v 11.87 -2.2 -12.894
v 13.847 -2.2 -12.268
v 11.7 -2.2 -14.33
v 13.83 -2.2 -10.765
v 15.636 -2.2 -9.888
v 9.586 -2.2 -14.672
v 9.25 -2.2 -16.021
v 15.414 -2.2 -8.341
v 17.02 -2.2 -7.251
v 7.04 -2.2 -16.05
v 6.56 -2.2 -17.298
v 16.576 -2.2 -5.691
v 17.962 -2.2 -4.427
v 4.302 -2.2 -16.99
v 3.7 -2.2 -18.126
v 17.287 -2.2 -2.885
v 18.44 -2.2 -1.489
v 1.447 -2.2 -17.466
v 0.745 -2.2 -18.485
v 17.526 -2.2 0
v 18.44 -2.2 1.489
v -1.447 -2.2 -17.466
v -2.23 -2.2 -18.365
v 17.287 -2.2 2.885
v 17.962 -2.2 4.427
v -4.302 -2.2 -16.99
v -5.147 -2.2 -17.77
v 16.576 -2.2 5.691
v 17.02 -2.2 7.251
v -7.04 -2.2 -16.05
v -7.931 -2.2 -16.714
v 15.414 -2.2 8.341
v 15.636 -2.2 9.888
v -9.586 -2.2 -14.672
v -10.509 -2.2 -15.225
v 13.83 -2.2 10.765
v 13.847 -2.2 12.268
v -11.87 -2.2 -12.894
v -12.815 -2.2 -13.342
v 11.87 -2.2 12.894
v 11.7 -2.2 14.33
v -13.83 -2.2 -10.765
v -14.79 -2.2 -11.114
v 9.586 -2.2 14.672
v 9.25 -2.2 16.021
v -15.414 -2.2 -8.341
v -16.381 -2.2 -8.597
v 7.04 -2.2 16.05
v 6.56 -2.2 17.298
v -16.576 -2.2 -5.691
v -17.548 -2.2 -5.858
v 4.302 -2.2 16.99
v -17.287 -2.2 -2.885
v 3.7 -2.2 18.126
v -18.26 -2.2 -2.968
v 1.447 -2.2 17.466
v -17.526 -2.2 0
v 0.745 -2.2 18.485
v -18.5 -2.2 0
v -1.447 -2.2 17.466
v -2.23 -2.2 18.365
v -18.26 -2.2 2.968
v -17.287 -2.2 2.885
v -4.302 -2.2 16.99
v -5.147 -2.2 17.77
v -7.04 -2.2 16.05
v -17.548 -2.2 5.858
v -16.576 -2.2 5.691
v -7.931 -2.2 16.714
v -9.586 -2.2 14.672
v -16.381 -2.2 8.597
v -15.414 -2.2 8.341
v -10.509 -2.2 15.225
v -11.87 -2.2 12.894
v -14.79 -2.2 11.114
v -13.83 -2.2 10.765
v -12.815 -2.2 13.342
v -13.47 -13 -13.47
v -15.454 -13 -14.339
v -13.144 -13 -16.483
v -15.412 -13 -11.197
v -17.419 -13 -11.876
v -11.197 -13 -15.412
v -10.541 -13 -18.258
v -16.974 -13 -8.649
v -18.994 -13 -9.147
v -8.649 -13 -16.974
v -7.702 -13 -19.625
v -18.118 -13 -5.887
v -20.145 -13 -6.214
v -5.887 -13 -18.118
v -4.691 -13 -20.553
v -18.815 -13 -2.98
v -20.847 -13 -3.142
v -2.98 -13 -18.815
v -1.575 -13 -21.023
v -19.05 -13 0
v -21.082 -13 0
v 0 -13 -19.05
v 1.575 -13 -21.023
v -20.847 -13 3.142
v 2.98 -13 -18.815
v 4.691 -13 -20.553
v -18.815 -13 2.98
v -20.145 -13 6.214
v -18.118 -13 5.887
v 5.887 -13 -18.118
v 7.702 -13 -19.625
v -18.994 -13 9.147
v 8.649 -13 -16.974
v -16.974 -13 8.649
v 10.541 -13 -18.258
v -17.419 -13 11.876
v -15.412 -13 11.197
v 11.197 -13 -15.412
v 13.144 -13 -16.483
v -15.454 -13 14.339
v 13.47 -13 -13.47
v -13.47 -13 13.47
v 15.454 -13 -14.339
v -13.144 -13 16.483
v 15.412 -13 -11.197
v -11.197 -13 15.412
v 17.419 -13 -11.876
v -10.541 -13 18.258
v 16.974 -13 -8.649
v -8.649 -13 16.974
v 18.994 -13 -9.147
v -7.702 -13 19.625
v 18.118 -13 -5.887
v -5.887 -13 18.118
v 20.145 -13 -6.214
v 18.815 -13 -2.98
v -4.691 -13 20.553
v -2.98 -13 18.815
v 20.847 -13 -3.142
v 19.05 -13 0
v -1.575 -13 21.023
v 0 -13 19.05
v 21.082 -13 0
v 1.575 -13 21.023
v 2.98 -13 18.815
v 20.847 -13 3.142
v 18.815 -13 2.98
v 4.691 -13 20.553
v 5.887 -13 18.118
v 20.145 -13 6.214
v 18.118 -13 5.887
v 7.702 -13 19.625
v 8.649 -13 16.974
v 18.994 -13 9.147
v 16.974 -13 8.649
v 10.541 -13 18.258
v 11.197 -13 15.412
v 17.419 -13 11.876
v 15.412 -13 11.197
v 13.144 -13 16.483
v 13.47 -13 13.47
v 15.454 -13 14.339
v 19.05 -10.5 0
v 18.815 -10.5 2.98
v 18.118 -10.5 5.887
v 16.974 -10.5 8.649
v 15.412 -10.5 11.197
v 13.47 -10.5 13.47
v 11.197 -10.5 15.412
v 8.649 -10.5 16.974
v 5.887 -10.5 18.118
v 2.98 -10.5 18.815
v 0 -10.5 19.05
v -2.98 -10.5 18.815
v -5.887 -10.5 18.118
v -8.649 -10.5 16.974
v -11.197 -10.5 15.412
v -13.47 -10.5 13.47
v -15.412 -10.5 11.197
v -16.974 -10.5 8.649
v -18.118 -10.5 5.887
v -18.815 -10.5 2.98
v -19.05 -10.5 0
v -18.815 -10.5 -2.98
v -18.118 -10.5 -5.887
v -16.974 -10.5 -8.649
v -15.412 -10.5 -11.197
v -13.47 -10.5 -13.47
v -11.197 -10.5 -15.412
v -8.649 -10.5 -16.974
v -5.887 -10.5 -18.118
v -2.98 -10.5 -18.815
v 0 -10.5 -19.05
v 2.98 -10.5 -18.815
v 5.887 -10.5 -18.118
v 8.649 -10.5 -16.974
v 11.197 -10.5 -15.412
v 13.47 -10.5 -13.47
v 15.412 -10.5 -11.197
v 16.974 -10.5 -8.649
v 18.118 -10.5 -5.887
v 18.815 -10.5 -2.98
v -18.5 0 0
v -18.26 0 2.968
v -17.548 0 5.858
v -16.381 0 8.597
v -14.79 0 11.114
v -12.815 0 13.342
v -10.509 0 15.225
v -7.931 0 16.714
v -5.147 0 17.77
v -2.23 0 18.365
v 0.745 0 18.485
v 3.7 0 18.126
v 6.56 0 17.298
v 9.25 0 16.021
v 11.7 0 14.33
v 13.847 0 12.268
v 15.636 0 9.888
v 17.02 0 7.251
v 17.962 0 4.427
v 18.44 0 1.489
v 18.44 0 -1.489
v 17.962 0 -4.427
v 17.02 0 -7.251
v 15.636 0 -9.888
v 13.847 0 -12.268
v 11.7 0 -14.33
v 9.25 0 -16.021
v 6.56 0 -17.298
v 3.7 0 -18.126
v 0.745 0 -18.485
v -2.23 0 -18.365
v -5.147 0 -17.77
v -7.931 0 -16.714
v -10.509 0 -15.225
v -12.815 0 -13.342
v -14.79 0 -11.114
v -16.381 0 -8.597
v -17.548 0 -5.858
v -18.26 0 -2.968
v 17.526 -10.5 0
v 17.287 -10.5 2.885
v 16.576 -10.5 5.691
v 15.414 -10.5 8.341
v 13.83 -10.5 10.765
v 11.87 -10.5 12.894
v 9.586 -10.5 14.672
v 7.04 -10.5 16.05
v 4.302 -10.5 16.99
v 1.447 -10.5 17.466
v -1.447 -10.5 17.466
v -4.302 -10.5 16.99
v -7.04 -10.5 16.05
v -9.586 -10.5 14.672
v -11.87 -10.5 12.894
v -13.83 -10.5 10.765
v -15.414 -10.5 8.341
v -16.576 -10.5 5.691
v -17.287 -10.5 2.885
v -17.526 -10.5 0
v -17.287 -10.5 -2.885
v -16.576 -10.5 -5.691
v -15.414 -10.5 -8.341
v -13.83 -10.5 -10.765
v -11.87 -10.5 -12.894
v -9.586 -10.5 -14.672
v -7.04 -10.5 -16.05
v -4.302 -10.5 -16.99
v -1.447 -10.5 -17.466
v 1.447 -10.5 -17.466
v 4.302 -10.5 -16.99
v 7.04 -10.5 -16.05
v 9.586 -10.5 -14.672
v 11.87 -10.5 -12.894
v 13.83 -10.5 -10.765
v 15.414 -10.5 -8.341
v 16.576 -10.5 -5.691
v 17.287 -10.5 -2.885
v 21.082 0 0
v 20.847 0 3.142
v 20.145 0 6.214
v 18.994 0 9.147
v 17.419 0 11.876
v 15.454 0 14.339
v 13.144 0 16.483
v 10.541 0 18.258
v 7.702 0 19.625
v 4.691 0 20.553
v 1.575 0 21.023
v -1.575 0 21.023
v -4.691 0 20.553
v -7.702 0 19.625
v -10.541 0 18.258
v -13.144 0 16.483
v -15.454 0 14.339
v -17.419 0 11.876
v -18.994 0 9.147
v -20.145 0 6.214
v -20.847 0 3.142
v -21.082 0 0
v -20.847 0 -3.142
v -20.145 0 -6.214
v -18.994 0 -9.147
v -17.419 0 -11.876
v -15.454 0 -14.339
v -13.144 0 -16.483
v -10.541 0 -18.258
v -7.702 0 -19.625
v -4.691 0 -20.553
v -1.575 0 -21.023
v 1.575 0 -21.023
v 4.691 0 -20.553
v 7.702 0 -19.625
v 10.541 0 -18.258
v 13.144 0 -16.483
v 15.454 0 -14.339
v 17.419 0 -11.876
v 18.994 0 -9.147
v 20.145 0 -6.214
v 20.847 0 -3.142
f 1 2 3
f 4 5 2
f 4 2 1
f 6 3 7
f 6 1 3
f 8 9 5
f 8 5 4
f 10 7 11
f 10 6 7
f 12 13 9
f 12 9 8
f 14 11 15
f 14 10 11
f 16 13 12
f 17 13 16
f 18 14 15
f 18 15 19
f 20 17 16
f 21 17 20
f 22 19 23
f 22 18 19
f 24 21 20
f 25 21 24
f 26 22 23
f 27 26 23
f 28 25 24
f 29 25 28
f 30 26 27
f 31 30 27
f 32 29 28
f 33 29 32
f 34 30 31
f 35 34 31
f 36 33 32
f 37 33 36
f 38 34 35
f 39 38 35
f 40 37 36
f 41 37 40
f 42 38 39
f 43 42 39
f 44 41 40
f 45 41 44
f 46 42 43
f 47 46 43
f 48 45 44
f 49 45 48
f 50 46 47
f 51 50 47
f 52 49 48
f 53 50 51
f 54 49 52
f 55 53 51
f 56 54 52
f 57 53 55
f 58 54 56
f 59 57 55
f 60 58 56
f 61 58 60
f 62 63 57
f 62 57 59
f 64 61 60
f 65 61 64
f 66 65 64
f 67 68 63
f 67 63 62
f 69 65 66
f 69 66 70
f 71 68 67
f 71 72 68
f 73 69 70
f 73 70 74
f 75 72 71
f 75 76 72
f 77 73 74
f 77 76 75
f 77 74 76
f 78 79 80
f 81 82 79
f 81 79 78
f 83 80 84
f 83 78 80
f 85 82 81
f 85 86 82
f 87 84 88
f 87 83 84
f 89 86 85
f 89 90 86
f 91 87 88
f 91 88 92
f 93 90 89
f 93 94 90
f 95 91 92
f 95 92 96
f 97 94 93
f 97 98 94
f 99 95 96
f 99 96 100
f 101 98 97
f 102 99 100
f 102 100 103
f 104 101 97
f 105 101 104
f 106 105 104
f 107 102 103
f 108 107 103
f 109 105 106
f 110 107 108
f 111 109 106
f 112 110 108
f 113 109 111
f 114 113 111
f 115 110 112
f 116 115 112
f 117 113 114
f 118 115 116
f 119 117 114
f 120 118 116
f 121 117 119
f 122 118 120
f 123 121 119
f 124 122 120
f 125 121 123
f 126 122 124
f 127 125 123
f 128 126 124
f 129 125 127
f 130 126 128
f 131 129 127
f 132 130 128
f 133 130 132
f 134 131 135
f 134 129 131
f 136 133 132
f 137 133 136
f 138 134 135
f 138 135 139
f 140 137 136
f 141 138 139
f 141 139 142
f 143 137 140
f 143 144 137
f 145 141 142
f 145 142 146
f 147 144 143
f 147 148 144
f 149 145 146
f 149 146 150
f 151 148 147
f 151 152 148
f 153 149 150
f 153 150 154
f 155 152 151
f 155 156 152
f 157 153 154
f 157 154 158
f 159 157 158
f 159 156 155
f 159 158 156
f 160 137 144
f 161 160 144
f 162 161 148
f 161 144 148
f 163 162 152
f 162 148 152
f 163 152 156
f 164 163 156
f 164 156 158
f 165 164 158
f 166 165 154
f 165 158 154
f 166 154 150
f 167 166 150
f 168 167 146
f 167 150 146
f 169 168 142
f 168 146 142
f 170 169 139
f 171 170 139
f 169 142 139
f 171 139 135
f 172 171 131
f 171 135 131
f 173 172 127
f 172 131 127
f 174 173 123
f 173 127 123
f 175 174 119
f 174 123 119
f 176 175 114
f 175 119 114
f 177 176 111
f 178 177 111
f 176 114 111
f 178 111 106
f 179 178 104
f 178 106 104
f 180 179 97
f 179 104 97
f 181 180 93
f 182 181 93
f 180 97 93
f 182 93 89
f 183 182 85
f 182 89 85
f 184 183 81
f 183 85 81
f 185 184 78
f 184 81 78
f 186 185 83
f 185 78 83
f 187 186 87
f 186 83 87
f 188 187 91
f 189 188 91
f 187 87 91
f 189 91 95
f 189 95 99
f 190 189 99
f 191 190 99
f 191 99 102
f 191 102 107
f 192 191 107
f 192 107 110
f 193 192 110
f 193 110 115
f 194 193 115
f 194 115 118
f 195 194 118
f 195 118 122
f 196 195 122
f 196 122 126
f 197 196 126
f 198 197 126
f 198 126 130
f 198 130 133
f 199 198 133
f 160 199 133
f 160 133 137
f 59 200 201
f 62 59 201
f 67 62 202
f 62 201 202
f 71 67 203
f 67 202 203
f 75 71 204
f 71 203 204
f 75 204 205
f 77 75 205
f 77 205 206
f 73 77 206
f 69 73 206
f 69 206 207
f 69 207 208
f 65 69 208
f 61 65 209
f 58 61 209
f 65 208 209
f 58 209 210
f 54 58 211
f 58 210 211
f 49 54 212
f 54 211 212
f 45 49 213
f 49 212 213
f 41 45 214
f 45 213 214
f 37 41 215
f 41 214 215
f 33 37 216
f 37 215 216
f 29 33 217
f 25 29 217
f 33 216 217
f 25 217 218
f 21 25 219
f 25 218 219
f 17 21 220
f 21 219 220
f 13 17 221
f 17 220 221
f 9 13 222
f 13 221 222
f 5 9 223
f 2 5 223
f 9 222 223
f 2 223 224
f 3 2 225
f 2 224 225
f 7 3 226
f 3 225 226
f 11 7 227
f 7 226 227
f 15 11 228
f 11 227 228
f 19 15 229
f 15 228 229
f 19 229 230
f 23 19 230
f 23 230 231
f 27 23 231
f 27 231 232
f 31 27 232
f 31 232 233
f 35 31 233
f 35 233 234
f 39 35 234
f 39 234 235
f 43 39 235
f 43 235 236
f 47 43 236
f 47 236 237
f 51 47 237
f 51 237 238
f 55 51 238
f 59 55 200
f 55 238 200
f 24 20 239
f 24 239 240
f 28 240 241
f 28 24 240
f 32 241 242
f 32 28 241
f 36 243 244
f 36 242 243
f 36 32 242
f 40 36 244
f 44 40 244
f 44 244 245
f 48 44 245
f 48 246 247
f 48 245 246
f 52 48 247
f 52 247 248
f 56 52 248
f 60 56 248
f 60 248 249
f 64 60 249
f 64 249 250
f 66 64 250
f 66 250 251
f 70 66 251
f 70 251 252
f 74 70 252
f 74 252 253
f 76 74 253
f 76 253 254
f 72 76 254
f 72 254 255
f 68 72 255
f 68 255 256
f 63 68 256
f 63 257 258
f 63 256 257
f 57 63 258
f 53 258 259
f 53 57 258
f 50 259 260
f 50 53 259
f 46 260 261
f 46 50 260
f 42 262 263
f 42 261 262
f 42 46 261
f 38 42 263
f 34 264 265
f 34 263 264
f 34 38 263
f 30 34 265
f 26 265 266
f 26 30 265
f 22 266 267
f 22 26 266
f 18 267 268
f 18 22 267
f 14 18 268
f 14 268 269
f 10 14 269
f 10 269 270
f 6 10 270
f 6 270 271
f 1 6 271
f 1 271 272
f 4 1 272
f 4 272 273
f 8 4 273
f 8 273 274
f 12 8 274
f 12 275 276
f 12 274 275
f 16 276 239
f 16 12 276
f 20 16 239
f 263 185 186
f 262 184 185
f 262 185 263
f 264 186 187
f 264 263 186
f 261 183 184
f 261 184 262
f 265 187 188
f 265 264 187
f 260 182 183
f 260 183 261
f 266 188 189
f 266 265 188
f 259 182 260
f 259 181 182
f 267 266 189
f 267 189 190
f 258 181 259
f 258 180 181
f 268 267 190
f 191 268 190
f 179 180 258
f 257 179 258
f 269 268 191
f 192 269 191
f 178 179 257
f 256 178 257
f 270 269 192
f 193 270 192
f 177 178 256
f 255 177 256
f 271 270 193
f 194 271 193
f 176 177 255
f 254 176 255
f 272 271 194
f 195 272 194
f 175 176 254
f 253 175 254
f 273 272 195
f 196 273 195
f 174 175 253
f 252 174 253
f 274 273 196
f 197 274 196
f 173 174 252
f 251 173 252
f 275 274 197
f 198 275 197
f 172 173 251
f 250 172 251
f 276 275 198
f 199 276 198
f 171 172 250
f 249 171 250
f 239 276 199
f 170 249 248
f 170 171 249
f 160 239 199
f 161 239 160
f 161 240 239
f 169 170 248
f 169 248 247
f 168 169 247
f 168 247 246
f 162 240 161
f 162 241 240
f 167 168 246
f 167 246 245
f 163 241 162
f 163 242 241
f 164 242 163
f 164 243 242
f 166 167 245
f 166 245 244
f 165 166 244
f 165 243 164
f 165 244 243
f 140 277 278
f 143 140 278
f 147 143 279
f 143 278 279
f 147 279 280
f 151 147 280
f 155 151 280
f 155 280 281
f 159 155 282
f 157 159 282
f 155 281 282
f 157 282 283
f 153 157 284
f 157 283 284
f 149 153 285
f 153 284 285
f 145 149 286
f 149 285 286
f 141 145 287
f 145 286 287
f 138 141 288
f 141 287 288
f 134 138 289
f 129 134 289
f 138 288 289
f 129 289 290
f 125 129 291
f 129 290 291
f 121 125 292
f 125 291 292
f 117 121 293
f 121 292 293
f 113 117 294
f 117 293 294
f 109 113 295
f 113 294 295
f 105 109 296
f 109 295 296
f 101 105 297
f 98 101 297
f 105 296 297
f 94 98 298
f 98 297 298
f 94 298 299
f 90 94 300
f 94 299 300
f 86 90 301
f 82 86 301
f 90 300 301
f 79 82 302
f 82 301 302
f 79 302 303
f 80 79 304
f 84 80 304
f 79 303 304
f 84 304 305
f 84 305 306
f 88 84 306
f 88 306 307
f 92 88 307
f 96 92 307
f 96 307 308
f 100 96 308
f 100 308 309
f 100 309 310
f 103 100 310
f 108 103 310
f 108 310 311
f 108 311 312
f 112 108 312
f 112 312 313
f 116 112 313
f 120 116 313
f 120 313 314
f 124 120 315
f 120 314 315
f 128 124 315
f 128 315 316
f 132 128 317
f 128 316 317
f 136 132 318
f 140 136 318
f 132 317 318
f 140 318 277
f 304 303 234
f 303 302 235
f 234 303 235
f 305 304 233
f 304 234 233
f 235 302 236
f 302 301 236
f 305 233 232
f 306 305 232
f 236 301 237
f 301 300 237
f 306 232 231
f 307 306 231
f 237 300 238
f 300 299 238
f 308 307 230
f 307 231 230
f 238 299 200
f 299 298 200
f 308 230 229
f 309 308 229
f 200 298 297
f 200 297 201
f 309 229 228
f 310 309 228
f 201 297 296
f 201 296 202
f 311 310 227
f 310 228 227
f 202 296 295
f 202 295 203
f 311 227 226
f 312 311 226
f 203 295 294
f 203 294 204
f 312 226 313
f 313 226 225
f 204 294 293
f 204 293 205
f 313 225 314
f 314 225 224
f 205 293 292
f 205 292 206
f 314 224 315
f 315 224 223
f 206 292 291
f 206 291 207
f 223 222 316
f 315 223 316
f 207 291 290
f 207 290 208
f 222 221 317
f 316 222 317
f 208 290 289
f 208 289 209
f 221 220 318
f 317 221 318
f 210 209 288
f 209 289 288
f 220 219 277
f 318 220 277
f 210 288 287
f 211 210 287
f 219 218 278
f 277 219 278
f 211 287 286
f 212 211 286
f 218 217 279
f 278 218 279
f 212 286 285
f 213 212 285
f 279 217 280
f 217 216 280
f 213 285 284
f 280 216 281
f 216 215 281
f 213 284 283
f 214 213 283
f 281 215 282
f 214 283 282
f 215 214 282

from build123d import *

# Parameters (mm, degrees)
F0_R     = 21.082
F0_R_2   = 17.526
F1_DEPTH = 13
F2_R     = 19.05
F3_DEPTH = 2.5
F4_R     = 18.5
F5_DEPTH = 2.2


with BuildPart() as f1:
    # F0 (on Front) → F1 (new body)
    with BuildSketch(Plane.XZ):
        Circle(F0_R)
        Circle(F0_R_2, mode=Mode.SUBTRACT)
    extrude(amount=F1_DEPTH)

    # F2 (on face) → F3 (cut)
    with BuildSketch(Plane.XZ.offset(13)):
        Circle(F2_R)
    extrude(amount=-F3_DEPTH, mode=Mode.SUBTRACT)

    # F4 (on face) → F5 (cut)
    with BuildSketch(Plane(origin=(0, 0, 0), x_dir=(-1, 0, 0), z_dir=(0, 1, 0))):
        Circle(F4_R)
    extrude(amount=-F5_DEPTH, mode=Mode.SUBTRACT)


solid = f1.part
